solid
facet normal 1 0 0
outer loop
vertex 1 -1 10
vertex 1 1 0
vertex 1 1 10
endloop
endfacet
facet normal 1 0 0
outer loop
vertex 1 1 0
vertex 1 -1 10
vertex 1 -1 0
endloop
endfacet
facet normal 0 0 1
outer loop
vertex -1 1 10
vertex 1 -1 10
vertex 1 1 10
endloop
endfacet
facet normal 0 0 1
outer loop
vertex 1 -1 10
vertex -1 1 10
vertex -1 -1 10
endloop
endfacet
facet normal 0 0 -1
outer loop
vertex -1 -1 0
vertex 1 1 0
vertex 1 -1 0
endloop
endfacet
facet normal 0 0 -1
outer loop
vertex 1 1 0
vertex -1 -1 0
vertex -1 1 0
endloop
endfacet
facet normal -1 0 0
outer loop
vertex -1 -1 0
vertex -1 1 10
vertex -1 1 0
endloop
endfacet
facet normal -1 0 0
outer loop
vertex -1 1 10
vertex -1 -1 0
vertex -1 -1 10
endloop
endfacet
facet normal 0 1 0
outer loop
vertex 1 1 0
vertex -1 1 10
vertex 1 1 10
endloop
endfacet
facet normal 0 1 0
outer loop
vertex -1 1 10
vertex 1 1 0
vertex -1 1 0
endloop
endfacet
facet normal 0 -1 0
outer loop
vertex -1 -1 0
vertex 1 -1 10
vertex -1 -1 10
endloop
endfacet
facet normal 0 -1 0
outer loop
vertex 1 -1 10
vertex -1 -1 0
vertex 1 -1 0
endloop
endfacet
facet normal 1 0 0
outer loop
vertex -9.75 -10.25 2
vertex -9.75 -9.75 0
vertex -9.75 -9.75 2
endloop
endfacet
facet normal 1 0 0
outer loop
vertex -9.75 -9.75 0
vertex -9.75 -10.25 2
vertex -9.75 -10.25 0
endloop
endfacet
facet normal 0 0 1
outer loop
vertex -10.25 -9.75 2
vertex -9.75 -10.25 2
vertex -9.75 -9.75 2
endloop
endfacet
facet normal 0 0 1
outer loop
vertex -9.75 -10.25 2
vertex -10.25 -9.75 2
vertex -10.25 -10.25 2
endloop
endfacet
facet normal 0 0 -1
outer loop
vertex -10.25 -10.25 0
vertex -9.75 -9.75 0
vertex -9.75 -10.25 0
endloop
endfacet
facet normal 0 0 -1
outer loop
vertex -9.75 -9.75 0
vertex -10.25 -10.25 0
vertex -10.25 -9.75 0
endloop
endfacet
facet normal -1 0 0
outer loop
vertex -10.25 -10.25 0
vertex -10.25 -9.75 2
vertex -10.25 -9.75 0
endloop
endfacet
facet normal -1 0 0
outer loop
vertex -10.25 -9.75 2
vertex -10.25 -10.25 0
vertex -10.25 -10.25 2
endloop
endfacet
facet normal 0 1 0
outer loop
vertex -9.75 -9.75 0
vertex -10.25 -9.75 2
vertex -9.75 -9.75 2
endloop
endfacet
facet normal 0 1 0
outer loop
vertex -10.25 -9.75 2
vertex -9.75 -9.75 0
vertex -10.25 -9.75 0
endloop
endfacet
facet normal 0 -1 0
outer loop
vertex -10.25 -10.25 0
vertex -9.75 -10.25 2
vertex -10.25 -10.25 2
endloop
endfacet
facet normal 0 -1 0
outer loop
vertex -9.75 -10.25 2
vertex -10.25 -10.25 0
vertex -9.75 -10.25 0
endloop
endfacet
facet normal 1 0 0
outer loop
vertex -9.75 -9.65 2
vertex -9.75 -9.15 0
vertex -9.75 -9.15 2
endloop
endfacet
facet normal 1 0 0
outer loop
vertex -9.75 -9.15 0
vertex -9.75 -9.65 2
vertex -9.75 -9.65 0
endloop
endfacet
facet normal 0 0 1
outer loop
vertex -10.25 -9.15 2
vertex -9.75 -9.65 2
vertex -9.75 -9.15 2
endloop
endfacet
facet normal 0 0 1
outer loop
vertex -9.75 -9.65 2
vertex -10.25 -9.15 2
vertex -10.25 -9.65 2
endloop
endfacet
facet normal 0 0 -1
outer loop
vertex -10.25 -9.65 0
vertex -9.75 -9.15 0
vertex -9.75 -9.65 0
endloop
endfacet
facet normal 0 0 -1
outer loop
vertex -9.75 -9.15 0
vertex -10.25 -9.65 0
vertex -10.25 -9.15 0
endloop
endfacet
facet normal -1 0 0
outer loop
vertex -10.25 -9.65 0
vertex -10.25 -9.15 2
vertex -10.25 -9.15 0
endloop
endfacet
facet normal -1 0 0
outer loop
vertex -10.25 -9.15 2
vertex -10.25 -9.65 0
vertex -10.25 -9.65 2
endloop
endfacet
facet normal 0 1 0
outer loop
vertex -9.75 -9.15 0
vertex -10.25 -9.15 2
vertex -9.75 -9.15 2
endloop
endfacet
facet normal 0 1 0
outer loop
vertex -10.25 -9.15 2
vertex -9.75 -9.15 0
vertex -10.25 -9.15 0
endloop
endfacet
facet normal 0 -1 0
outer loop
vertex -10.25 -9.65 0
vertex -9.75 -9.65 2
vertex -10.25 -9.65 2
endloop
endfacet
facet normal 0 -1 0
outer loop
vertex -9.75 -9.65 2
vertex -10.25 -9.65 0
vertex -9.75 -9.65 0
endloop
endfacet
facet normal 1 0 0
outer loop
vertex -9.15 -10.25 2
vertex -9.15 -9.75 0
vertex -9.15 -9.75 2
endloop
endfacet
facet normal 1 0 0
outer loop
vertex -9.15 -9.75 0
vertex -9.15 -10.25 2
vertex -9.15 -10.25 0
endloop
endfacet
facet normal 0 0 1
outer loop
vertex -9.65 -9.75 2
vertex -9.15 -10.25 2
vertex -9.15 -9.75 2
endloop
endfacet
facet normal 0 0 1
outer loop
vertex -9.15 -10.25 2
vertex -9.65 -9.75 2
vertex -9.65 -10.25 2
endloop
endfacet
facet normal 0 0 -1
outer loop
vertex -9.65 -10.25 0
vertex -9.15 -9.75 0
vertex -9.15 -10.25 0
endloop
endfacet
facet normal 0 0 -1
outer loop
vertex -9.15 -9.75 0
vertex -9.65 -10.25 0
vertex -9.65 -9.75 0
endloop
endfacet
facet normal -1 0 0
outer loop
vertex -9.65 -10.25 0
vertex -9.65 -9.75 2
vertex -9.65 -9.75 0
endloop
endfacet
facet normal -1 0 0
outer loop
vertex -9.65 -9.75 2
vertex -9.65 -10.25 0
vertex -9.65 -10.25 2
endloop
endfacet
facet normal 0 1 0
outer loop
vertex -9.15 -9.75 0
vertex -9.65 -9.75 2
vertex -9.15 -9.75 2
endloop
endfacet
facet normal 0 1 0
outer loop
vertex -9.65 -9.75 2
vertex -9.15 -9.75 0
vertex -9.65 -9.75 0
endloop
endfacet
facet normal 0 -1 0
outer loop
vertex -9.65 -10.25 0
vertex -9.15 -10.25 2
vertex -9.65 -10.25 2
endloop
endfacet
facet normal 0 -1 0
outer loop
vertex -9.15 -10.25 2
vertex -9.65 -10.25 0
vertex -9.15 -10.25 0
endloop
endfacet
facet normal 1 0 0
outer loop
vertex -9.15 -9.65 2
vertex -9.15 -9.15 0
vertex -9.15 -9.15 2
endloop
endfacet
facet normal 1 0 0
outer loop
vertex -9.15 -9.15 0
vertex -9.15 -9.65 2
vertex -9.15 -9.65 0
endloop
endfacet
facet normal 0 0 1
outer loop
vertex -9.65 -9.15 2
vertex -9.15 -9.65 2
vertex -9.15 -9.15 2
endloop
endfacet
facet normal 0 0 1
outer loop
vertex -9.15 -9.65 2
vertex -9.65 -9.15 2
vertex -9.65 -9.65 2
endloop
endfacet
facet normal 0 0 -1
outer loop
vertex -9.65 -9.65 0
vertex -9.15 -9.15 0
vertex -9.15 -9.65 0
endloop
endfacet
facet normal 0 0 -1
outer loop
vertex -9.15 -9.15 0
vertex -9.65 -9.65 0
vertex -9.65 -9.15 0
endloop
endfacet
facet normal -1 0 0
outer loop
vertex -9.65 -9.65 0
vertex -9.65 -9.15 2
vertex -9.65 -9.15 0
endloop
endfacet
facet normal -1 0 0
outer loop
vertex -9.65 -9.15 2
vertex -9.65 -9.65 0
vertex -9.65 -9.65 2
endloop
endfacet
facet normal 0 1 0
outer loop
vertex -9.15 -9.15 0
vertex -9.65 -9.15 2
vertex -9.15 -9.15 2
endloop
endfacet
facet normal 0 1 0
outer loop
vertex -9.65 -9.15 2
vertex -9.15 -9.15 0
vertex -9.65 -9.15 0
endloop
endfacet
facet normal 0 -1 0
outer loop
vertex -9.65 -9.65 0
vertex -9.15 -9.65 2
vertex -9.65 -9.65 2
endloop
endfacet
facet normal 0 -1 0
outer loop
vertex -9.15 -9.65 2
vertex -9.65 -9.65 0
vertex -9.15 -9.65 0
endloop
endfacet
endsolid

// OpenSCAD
translate([0, 0, 5]) color([0,1,0,0.9]) cube([2, 2, 10], center=true);
translate([-10.0, -10.0, 1]) color([1,0,0]) cube([0.5, 0.5, 2], center=true);
translate([-10.0, -9.4, 1]) color([1,0,0]) cube([0.5, 0.5, 2], center=true);
translate([-9.4, -10.0, 1]) color([1,0,0]) cube([0.5, 0.5, 2], center=true);
translate([-9.4, -9.4, 1]) color([1,0,0]) cube([0.5, 0.5, 2], center=true);
